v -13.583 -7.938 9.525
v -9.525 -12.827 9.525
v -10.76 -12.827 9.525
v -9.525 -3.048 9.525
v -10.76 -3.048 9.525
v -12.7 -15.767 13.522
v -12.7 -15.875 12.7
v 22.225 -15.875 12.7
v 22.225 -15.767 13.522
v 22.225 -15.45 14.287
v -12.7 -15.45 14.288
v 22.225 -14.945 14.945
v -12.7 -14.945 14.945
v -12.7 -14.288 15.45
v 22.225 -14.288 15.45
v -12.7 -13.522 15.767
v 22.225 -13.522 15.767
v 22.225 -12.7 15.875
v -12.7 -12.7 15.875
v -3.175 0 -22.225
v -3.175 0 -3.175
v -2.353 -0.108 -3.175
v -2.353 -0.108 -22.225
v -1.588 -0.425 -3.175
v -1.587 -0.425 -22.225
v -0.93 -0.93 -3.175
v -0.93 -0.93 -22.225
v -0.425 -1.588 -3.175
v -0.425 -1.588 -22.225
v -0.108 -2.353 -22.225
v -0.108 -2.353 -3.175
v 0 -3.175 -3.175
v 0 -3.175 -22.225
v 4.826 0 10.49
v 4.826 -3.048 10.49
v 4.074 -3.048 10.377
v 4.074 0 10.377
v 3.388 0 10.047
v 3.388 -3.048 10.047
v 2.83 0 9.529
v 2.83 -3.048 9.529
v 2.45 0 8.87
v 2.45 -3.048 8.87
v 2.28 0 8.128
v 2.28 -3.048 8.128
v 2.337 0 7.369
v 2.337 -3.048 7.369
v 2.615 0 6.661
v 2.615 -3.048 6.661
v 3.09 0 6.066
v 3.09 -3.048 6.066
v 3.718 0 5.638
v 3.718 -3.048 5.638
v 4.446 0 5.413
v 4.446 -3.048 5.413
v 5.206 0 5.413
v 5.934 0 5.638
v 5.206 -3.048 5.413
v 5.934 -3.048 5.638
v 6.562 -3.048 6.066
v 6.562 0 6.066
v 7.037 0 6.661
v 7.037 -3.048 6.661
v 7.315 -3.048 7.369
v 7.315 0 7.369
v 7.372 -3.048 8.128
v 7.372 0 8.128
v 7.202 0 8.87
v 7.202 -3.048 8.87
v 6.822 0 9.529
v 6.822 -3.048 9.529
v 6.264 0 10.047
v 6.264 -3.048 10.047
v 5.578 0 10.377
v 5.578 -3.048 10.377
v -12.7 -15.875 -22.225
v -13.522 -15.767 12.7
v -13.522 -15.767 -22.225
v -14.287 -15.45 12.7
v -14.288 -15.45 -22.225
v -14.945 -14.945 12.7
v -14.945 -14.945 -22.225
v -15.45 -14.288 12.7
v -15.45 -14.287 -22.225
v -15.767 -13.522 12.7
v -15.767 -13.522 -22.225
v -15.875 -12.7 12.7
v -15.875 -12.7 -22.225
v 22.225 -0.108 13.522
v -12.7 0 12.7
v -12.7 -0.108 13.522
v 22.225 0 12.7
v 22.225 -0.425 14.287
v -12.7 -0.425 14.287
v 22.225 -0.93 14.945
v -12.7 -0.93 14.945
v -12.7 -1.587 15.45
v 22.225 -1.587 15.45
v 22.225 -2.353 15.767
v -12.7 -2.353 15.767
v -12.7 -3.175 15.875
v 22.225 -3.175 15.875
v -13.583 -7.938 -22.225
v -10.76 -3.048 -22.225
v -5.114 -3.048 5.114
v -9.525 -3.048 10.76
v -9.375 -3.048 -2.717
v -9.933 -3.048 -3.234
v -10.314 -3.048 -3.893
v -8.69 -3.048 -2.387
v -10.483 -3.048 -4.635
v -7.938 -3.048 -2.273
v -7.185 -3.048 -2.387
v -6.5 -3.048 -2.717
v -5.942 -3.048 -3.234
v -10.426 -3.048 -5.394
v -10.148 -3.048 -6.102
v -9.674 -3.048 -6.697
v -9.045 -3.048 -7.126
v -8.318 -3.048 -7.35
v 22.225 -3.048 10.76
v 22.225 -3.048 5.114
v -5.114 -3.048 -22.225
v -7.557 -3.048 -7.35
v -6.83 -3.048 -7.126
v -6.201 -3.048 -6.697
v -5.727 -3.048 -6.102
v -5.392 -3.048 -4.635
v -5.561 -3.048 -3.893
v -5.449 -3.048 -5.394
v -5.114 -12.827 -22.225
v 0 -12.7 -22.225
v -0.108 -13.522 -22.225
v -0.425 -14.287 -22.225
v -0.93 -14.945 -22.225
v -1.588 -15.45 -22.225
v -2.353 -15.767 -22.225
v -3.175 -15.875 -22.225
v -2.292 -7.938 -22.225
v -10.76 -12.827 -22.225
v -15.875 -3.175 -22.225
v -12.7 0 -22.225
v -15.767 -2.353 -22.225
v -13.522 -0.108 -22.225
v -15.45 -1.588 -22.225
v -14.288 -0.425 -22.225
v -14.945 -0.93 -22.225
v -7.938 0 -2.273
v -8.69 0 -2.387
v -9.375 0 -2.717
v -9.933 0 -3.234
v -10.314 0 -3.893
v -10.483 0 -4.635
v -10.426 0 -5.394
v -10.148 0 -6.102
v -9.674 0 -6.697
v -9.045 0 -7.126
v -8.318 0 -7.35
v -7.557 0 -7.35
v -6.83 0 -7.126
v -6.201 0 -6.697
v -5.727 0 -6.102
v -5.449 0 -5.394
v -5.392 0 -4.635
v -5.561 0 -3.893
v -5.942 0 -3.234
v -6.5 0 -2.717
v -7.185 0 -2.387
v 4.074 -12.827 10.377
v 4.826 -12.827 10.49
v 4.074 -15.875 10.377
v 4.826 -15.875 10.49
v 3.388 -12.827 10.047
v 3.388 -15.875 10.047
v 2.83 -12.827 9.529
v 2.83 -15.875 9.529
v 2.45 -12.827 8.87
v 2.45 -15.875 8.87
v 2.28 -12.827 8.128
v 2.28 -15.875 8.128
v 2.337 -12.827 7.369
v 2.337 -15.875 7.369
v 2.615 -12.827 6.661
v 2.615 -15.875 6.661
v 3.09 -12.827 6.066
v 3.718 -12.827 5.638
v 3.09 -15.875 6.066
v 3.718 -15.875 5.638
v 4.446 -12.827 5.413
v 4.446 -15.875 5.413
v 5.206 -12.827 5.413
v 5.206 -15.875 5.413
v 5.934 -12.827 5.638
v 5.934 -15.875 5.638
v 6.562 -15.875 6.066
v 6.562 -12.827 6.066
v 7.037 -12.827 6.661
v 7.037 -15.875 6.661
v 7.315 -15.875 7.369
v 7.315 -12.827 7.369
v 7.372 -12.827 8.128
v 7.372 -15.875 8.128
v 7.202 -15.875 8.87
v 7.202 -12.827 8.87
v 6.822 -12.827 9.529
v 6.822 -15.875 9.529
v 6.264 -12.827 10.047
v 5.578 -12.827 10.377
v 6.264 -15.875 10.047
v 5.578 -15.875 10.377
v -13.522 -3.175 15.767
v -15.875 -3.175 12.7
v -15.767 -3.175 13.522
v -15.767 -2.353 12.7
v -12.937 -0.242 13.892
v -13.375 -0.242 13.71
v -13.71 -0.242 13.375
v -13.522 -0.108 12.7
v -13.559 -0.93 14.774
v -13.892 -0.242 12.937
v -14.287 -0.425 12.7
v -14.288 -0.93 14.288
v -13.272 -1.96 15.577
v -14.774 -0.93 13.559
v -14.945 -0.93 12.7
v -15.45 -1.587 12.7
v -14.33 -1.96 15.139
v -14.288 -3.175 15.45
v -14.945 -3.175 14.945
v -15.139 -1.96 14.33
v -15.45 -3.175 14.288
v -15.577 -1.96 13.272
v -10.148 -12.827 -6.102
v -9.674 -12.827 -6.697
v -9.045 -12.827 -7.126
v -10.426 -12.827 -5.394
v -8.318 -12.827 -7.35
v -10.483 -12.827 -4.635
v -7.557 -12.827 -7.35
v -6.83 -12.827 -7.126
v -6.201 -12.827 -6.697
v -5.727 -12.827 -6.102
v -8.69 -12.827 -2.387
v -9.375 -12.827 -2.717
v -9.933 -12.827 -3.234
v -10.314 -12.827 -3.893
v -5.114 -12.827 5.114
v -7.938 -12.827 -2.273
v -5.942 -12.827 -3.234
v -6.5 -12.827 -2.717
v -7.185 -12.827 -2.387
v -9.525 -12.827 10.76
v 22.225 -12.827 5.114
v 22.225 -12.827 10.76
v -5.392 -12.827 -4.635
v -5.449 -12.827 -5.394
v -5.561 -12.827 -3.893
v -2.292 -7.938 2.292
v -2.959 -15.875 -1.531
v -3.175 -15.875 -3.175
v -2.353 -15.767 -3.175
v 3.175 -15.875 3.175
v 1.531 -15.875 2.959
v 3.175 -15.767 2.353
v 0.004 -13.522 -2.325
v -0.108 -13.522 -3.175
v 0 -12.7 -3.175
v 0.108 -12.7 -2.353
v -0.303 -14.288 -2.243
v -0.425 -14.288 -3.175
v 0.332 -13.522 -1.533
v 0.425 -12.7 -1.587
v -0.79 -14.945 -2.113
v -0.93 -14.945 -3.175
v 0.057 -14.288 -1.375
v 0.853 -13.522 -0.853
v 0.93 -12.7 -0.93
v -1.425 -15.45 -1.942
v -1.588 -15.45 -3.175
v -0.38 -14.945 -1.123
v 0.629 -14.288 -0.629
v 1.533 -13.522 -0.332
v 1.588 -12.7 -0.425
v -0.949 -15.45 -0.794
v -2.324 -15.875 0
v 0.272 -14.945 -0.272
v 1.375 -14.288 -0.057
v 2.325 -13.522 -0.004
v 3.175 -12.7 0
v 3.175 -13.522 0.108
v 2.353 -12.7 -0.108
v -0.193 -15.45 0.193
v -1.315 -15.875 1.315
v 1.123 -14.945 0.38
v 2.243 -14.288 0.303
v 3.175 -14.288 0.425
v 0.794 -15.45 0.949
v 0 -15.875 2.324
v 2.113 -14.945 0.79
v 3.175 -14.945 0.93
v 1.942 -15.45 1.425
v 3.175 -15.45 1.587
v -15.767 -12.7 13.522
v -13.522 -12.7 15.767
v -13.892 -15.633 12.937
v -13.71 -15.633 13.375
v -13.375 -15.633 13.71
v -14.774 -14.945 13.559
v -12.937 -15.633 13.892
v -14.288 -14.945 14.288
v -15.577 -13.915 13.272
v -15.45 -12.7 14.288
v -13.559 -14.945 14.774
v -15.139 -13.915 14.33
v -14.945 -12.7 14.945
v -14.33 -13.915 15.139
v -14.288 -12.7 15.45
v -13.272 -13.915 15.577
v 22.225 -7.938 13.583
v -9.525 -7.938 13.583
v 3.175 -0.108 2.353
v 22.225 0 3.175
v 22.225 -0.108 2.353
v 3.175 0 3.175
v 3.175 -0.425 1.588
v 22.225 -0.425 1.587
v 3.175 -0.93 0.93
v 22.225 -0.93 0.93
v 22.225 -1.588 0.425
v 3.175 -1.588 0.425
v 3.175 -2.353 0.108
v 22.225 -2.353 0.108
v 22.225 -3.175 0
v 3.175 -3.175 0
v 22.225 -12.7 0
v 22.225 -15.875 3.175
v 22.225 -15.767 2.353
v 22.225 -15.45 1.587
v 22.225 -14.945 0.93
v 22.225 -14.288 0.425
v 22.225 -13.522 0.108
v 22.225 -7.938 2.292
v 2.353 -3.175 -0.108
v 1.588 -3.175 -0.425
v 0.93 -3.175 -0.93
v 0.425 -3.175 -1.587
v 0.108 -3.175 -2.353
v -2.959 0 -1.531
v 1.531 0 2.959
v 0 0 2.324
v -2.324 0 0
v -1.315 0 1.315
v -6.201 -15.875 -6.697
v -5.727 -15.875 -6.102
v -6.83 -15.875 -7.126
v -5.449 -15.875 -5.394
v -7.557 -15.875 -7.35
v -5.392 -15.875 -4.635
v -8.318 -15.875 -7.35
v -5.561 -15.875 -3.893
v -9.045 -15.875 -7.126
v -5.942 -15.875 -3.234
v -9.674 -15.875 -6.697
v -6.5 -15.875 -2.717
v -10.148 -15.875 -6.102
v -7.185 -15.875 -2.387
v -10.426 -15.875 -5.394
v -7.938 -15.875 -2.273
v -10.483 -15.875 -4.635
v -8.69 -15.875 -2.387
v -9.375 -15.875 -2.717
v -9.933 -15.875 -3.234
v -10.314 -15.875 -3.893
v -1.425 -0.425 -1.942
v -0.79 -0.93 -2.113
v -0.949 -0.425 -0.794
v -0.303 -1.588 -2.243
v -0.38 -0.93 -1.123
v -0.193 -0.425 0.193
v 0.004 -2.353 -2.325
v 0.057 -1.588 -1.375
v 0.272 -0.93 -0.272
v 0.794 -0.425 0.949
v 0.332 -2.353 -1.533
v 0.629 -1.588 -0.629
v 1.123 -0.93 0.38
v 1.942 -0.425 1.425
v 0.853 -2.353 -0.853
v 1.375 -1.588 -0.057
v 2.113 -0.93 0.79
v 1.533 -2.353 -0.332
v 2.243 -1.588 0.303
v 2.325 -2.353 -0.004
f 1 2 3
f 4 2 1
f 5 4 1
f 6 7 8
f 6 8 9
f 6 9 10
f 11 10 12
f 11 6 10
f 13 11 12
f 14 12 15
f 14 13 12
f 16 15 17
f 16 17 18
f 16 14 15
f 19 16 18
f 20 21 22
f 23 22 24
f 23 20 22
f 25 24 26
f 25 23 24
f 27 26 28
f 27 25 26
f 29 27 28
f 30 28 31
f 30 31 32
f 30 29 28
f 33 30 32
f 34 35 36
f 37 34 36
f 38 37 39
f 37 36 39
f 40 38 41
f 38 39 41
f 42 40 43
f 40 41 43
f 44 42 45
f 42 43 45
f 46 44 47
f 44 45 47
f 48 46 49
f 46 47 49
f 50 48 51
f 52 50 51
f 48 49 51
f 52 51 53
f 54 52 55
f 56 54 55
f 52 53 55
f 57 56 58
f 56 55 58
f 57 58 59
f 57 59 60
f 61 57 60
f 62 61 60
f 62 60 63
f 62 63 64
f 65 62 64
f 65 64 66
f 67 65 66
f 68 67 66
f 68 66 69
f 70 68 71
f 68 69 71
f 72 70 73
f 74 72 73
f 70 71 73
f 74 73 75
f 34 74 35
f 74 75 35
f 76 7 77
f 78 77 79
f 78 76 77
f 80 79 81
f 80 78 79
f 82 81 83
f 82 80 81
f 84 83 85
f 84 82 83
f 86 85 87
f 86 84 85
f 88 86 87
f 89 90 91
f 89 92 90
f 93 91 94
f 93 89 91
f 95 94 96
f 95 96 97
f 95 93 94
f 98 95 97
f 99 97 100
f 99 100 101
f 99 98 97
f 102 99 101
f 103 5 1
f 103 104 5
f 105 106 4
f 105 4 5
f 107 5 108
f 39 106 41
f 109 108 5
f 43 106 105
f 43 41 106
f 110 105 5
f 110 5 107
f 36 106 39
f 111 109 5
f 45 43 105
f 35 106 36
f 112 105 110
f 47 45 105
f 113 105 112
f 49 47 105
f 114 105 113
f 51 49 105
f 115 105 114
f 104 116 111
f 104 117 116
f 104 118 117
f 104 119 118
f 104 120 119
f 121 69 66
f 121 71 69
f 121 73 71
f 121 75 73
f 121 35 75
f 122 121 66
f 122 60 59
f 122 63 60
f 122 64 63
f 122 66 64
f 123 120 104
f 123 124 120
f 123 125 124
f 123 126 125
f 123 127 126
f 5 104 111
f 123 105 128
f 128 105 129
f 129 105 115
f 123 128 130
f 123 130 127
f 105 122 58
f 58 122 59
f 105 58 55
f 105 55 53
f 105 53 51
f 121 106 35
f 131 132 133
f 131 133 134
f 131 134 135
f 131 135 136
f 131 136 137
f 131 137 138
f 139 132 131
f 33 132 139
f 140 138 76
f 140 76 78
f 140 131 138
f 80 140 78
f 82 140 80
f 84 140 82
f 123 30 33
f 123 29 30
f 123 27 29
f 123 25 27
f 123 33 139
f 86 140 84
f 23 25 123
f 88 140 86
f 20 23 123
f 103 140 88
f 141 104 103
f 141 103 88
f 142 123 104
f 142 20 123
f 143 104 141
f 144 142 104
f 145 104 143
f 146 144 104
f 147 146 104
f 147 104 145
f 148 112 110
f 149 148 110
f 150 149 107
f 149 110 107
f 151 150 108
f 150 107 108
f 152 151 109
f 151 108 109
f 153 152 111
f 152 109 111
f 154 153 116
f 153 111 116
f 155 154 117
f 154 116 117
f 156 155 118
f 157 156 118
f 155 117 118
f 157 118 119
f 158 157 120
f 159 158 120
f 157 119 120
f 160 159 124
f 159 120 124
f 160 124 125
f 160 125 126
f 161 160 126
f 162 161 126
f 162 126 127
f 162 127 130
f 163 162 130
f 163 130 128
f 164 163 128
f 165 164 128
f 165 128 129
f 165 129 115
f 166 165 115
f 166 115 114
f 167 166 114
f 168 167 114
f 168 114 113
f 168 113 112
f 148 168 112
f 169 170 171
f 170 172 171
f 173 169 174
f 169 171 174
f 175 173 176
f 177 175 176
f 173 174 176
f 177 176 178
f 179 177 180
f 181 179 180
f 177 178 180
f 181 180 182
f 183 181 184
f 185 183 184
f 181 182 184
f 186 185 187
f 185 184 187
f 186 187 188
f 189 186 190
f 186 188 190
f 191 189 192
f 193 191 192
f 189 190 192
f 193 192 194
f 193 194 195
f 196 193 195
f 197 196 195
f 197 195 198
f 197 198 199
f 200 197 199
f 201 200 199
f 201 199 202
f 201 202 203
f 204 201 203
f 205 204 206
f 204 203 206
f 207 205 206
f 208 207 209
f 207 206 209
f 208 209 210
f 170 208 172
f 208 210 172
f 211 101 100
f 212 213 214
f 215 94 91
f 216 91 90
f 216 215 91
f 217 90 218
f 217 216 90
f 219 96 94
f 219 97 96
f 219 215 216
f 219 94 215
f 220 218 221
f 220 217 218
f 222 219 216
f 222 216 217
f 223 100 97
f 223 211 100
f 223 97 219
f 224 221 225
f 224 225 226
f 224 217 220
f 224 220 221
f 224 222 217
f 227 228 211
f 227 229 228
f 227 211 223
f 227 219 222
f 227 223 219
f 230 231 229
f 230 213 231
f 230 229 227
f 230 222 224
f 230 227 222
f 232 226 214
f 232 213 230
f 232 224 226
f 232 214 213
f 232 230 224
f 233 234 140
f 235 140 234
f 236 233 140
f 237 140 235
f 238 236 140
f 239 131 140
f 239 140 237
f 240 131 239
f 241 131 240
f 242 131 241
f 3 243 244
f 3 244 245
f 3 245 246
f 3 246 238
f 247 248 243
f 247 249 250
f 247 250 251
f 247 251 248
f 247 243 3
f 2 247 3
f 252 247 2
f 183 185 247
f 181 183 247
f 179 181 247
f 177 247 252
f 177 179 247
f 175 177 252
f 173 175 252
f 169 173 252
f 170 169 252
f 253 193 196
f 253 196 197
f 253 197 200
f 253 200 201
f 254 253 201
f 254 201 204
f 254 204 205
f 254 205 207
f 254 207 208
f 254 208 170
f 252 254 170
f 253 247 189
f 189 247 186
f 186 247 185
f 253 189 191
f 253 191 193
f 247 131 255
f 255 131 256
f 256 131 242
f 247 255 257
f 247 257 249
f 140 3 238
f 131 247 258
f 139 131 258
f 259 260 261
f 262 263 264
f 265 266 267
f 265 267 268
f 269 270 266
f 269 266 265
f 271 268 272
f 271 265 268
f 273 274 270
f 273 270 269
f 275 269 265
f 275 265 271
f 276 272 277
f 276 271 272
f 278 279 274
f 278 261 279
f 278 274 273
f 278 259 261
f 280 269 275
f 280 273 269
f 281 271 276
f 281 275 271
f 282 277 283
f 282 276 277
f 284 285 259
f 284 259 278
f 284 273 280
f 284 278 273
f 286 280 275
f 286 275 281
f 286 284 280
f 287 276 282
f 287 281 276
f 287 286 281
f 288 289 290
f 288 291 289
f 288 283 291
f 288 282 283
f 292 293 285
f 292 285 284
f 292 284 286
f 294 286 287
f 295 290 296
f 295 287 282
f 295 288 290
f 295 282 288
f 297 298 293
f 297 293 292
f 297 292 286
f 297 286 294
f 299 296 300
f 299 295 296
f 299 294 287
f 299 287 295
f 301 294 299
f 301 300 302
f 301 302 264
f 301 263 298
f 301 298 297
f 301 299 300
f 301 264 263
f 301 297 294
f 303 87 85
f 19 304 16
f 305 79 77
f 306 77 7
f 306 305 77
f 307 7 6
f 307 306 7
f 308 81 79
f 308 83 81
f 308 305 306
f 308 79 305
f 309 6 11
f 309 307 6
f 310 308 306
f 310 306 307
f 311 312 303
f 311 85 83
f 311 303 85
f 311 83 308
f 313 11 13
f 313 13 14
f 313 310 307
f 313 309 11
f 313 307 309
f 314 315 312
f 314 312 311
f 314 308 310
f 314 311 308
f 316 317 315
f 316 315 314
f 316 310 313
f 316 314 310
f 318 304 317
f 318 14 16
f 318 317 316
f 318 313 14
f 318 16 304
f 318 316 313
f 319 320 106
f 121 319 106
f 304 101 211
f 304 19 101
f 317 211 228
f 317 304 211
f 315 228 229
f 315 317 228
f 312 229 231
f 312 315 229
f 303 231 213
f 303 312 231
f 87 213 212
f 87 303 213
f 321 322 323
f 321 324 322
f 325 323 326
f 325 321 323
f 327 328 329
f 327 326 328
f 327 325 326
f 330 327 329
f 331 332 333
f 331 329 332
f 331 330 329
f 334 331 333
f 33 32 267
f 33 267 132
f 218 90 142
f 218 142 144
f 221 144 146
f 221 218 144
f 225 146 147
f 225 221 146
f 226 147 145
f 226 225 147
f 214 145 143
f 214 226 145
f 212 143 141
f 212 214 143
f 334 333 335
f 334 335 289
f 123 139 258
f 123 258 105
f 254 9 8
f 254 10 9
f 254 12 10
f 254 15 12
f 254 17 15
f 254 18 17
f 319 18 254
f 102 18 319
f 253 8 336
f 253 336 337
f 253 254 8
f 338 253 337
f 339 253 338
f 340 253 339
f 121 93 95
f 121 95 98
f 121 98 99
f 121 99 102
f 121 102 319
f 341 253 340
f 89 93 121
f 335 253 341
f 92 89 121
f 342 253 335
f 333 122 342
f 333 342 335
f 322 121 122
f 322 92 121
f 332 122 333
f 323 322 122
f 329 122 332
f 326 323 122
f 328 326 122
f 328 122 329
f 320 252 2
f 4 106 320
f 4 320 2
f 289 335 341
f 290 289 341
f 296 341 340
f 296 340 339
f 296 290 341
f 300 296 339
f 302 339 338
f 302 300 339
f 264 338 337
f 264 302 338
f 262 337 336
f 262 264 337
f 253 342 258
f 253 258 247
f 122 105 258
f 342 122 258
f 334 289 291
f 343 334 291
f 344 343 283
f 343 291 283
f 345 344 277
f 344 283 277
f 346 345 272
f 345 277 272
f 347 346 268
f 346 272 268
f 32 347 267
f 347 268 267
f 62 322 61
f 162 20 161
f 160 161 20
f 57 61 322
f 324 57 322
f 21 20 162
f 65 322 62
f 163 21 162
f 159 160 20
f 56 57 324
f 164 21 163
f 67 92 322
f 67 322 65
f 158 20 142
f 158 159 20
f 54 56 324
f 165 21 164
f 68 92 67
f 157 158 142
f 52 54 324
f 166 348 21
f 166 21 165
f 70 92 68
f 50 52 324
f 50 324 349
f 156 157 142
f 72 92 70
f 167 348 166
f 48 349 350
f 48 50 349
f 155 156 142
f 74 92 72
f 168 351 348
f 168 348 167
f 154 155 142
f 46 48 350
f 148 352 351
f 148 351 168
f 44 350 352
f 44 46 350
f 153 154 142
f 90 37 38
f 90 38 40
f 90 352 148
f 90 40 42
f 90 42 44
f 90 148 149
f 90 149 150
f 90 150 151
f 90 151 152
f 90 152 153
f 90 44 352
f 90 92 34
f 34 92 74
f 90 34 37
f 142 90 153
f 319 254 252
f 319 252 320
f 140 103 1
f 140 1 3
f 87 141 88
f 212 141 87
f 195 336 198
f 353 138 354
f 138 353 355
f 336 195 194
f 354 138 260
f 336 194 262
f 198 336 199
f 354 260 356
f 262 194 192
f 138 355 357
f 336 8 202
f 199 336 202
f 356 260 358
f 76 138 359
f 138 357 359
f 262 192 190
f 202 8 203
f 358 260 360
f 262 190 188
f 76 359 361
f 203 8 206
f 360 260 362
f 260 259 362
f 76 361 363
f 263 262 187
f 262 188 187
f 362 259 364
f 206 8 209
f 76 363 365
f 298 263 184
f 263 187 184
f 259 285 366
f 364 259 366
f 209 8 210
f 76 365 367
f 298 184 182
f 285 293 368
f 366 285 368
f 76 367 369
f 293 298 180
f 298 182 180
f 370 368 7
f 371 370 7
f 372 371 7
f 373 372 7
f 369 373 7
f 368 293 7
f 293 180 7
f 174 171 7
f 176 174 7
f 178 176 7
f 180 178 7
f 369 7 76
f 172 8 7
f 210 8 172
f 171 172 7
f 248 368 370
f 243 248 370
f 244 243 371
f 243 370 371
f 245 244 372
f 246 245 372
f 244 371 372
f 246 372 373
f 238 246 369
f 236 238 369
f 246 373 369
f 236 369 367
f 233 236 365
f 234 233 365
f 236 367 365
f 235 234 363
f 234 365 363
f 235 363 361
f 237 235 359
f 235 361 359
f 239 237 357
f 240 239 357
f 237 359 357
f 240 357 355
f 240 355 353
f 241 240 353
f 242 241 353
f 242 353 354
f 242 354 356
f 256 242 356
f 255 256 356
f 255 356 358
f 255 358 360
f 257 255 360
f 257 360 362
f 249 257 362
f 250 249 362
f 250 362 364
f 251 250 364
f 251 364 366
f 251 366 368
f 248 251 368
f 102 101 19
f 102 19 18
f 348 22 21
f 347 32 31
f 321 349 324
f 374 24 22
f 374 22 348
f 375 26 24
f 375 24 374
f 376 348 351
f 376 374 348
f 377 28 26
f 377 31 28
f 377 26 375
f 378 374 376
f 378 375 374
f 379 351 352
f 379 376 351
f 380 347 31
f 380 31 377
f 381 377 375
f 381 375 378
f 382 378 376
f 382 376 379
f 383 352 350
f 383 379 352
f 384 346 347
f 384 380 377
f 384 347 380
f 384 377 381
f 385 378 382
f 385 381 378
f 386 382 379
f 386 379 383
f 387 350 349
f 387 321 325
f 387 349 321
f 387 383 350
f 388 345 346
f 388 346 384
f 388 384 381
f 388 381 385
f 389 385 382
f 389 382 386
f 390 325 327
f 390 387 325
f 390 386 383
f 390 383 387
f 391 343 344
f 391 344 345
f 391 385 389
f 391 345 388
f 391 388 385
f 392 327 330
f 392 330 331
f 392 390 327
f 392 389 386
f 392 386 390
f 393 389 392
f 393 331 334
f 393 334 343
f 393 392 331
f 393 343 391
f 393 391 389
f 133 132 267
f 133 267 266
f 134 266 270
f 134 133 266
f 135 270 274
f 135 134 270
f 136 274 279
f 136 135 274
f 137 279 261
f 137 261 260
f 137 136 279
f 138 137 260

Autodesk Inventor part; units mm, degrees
ref_plane "YZ Plane" through (0, 0, 0) normal (1, 0, 0) x (0, 1, 0)
ref_plane "XZ Plane" through (0, 0, 0) normal (0, 1, 0) x (-1, 0, 0)
ref_plane "XY Plane" through (0, 0, 0) normal (0, 0, 1) x (1, 0, 0)
sketch "Sketch1" plane through (0, 0, 0) normal (0, 1, 0) x (-1, 0, 0)
  line L0 (0, 0) -> (0, -22.225)
  line L1 (0, -22.225) -> (15.875, -22.225)
  line L2 (15.875, -22.225) -> (15.875, 15.875)
  line L3 (15.875, 15.875) -> (-22.225, 15.875)
  line L4 (-22.225, 15.875) -> (-22.225, 0)
  line L5 (-22.225, 0) -> (0, 0)
  dimension "d0" = 15.875
  dimension "d1" = 38.1
extrude "Extrusion1" add sketch "Sketch1" against normal blind 15.875
sketch "Sketch3" plane through (0, 0, -22.225) normal (0, 0, -1) x (-1, 0, 0)
  line L0 (5.1145, -3.048) -> (10.7605, -3.048)
  line L1 (10.7605, -3.048) -> (13.5834, -7.9375)
  line L2 (13.5834, -7.9375) -> (10.7605, -12.827)
  line L3 (10.7605, -12.827) -> (5.1145, -12.827)
  line L4 (5.1145, -12.827) -> (2.2916, -7.9375)
  line L5 (2.2916, -7.9375) -> (5.1145, -3.048)
  line L6 (15.875, -15.875) -> (0, -15.875) projected
  line L7 (0, 0) -> (0, -15.875) projected
  point P0 (7.9375, -7.9375)
  dimension "d5" = 7.9375
  dimension "d6" = 7.9375
  dimension "d7" = 9.779
extrude "Extrusion2" cut sketch "Sketch3" against normal blind 31.75
sketch "Sketch4" plane through (22.225, 0, 15.875) normal (1, 0, 0) x (0, 0, -1)
  line L0 (13.5834, -7.9375) -> (10.7605, -12.827)
  line L1 (10.7605, -12.827) -> (5.1145, -12.827)
  line L2 (5.1145, -12.827) -> (2.2916, -7.9375)
  line L3 (2.2916, -7.9375) -> (5.1145, -3.048)
  line L4 (5.1145, -3.048) -> (10.7605, -3.048)
  line L5 (10.7605, -3.048) -> (13.5834, -7.9375)
  line L6 (0, 0) -> (15.875, 0) projected
  line L7 (15.875, 0) -> (15.875, -15.875) projected
  point P0 (7.9375, -7.9375)
  dimension "d10" = 9.779
  dimension "d11" = 7.9375
  dimension "d12" = 7.9375
extrude "Extrusion3" cut sketch "Sketch4" against normal blind 31.75
sketch "Sketch5" plane through (0, 0, 0) normal (0, 1, 0) x (1, 0, 0)
  line L0 (-15.875, 22.225) -> (-15.875, -15.875) projected
  line L1 (-15.875, -15.875) -> (22.225, -15.875) projected
  line L2 (0, 22.225) -> (-15.875, 22.225) projected
  line L3 (22.225, -15.875) -> (22.225, 0) projected
  point P0 (0, 0)
  point P1 (-7.9375, 4.826)
  point P2 (4.826, -7.9375)
  dimension "d15" = 7.9375
  dimension "d16" = 7.9375
  dimension "d17" = 17.399
  dimension "d18" = 17.399
hole "Hole1" at (-7.9375, 0, -4.826) at (4.826, 0, 7.9375) direction (0, -1, 0) diameter 5.1054 end through all clearance for "Flat Head Machine Screw (82)" size "#10" standard "Ansi Unified Screw Threads"
fillet "Fillet1" radius 3.175 6 edges at (-15.875, -7.9375, 15.875) (0, -7.9375, 0) (11.1125, 0, 0) (0, 0, -11.1125) (3.175, 0, 15.875) (-15.875, 0, -3.175)
fillet "Fillet2" radius 3.175 5 edges at (-14.9451, -15.875, 14.9451) (4.7625, -15.875, 15.875) (-15.875, -15.875, -4.7625) (12.7, -15.875, 0) (0, -15.875, -12.7)
equation "\"d0\" = pieceWidth"
equation "\"d1\" = pieceLength"
equation "\"d2\" = pieceWidth"
equation "\"d5\" = 0.5 * pieceWidth"
equation "\"d6\" = 0.5 * pieceWidth"
equation "\"d7\" = hex"
equation "\"d8\" = depthOfHexCut"
equation "\"d10\" = hex"
equation "\"d11\" = 0.5 * pieceWidth"
equation "\"d12\" = 0.5 * pieceWidth"
equation "\"d13\" = depthOfHexCut"
equation "\"d15\" = 0.5 * pieceWidth"
equation "\"d16\" = 0.5 * pieceWidth"
equation "\"d17\" = depthForHexBracket"
equation "\"d18\" = depthForHexBracket"
equation "\"pieceWidth\" = 15.875"
equation "\"pieceLength\" = 38.1"
equation "\"depthOfInsert\" = 25.4"
equation "\"printingError\" = 0.254"
equation "\"depthForHexBracket\" = 17.399"
equation "\"hex\" = 9.779"
equation "\"depthOfHexCut\" = 31.75"
properties part number "3_8_angleJoint"
